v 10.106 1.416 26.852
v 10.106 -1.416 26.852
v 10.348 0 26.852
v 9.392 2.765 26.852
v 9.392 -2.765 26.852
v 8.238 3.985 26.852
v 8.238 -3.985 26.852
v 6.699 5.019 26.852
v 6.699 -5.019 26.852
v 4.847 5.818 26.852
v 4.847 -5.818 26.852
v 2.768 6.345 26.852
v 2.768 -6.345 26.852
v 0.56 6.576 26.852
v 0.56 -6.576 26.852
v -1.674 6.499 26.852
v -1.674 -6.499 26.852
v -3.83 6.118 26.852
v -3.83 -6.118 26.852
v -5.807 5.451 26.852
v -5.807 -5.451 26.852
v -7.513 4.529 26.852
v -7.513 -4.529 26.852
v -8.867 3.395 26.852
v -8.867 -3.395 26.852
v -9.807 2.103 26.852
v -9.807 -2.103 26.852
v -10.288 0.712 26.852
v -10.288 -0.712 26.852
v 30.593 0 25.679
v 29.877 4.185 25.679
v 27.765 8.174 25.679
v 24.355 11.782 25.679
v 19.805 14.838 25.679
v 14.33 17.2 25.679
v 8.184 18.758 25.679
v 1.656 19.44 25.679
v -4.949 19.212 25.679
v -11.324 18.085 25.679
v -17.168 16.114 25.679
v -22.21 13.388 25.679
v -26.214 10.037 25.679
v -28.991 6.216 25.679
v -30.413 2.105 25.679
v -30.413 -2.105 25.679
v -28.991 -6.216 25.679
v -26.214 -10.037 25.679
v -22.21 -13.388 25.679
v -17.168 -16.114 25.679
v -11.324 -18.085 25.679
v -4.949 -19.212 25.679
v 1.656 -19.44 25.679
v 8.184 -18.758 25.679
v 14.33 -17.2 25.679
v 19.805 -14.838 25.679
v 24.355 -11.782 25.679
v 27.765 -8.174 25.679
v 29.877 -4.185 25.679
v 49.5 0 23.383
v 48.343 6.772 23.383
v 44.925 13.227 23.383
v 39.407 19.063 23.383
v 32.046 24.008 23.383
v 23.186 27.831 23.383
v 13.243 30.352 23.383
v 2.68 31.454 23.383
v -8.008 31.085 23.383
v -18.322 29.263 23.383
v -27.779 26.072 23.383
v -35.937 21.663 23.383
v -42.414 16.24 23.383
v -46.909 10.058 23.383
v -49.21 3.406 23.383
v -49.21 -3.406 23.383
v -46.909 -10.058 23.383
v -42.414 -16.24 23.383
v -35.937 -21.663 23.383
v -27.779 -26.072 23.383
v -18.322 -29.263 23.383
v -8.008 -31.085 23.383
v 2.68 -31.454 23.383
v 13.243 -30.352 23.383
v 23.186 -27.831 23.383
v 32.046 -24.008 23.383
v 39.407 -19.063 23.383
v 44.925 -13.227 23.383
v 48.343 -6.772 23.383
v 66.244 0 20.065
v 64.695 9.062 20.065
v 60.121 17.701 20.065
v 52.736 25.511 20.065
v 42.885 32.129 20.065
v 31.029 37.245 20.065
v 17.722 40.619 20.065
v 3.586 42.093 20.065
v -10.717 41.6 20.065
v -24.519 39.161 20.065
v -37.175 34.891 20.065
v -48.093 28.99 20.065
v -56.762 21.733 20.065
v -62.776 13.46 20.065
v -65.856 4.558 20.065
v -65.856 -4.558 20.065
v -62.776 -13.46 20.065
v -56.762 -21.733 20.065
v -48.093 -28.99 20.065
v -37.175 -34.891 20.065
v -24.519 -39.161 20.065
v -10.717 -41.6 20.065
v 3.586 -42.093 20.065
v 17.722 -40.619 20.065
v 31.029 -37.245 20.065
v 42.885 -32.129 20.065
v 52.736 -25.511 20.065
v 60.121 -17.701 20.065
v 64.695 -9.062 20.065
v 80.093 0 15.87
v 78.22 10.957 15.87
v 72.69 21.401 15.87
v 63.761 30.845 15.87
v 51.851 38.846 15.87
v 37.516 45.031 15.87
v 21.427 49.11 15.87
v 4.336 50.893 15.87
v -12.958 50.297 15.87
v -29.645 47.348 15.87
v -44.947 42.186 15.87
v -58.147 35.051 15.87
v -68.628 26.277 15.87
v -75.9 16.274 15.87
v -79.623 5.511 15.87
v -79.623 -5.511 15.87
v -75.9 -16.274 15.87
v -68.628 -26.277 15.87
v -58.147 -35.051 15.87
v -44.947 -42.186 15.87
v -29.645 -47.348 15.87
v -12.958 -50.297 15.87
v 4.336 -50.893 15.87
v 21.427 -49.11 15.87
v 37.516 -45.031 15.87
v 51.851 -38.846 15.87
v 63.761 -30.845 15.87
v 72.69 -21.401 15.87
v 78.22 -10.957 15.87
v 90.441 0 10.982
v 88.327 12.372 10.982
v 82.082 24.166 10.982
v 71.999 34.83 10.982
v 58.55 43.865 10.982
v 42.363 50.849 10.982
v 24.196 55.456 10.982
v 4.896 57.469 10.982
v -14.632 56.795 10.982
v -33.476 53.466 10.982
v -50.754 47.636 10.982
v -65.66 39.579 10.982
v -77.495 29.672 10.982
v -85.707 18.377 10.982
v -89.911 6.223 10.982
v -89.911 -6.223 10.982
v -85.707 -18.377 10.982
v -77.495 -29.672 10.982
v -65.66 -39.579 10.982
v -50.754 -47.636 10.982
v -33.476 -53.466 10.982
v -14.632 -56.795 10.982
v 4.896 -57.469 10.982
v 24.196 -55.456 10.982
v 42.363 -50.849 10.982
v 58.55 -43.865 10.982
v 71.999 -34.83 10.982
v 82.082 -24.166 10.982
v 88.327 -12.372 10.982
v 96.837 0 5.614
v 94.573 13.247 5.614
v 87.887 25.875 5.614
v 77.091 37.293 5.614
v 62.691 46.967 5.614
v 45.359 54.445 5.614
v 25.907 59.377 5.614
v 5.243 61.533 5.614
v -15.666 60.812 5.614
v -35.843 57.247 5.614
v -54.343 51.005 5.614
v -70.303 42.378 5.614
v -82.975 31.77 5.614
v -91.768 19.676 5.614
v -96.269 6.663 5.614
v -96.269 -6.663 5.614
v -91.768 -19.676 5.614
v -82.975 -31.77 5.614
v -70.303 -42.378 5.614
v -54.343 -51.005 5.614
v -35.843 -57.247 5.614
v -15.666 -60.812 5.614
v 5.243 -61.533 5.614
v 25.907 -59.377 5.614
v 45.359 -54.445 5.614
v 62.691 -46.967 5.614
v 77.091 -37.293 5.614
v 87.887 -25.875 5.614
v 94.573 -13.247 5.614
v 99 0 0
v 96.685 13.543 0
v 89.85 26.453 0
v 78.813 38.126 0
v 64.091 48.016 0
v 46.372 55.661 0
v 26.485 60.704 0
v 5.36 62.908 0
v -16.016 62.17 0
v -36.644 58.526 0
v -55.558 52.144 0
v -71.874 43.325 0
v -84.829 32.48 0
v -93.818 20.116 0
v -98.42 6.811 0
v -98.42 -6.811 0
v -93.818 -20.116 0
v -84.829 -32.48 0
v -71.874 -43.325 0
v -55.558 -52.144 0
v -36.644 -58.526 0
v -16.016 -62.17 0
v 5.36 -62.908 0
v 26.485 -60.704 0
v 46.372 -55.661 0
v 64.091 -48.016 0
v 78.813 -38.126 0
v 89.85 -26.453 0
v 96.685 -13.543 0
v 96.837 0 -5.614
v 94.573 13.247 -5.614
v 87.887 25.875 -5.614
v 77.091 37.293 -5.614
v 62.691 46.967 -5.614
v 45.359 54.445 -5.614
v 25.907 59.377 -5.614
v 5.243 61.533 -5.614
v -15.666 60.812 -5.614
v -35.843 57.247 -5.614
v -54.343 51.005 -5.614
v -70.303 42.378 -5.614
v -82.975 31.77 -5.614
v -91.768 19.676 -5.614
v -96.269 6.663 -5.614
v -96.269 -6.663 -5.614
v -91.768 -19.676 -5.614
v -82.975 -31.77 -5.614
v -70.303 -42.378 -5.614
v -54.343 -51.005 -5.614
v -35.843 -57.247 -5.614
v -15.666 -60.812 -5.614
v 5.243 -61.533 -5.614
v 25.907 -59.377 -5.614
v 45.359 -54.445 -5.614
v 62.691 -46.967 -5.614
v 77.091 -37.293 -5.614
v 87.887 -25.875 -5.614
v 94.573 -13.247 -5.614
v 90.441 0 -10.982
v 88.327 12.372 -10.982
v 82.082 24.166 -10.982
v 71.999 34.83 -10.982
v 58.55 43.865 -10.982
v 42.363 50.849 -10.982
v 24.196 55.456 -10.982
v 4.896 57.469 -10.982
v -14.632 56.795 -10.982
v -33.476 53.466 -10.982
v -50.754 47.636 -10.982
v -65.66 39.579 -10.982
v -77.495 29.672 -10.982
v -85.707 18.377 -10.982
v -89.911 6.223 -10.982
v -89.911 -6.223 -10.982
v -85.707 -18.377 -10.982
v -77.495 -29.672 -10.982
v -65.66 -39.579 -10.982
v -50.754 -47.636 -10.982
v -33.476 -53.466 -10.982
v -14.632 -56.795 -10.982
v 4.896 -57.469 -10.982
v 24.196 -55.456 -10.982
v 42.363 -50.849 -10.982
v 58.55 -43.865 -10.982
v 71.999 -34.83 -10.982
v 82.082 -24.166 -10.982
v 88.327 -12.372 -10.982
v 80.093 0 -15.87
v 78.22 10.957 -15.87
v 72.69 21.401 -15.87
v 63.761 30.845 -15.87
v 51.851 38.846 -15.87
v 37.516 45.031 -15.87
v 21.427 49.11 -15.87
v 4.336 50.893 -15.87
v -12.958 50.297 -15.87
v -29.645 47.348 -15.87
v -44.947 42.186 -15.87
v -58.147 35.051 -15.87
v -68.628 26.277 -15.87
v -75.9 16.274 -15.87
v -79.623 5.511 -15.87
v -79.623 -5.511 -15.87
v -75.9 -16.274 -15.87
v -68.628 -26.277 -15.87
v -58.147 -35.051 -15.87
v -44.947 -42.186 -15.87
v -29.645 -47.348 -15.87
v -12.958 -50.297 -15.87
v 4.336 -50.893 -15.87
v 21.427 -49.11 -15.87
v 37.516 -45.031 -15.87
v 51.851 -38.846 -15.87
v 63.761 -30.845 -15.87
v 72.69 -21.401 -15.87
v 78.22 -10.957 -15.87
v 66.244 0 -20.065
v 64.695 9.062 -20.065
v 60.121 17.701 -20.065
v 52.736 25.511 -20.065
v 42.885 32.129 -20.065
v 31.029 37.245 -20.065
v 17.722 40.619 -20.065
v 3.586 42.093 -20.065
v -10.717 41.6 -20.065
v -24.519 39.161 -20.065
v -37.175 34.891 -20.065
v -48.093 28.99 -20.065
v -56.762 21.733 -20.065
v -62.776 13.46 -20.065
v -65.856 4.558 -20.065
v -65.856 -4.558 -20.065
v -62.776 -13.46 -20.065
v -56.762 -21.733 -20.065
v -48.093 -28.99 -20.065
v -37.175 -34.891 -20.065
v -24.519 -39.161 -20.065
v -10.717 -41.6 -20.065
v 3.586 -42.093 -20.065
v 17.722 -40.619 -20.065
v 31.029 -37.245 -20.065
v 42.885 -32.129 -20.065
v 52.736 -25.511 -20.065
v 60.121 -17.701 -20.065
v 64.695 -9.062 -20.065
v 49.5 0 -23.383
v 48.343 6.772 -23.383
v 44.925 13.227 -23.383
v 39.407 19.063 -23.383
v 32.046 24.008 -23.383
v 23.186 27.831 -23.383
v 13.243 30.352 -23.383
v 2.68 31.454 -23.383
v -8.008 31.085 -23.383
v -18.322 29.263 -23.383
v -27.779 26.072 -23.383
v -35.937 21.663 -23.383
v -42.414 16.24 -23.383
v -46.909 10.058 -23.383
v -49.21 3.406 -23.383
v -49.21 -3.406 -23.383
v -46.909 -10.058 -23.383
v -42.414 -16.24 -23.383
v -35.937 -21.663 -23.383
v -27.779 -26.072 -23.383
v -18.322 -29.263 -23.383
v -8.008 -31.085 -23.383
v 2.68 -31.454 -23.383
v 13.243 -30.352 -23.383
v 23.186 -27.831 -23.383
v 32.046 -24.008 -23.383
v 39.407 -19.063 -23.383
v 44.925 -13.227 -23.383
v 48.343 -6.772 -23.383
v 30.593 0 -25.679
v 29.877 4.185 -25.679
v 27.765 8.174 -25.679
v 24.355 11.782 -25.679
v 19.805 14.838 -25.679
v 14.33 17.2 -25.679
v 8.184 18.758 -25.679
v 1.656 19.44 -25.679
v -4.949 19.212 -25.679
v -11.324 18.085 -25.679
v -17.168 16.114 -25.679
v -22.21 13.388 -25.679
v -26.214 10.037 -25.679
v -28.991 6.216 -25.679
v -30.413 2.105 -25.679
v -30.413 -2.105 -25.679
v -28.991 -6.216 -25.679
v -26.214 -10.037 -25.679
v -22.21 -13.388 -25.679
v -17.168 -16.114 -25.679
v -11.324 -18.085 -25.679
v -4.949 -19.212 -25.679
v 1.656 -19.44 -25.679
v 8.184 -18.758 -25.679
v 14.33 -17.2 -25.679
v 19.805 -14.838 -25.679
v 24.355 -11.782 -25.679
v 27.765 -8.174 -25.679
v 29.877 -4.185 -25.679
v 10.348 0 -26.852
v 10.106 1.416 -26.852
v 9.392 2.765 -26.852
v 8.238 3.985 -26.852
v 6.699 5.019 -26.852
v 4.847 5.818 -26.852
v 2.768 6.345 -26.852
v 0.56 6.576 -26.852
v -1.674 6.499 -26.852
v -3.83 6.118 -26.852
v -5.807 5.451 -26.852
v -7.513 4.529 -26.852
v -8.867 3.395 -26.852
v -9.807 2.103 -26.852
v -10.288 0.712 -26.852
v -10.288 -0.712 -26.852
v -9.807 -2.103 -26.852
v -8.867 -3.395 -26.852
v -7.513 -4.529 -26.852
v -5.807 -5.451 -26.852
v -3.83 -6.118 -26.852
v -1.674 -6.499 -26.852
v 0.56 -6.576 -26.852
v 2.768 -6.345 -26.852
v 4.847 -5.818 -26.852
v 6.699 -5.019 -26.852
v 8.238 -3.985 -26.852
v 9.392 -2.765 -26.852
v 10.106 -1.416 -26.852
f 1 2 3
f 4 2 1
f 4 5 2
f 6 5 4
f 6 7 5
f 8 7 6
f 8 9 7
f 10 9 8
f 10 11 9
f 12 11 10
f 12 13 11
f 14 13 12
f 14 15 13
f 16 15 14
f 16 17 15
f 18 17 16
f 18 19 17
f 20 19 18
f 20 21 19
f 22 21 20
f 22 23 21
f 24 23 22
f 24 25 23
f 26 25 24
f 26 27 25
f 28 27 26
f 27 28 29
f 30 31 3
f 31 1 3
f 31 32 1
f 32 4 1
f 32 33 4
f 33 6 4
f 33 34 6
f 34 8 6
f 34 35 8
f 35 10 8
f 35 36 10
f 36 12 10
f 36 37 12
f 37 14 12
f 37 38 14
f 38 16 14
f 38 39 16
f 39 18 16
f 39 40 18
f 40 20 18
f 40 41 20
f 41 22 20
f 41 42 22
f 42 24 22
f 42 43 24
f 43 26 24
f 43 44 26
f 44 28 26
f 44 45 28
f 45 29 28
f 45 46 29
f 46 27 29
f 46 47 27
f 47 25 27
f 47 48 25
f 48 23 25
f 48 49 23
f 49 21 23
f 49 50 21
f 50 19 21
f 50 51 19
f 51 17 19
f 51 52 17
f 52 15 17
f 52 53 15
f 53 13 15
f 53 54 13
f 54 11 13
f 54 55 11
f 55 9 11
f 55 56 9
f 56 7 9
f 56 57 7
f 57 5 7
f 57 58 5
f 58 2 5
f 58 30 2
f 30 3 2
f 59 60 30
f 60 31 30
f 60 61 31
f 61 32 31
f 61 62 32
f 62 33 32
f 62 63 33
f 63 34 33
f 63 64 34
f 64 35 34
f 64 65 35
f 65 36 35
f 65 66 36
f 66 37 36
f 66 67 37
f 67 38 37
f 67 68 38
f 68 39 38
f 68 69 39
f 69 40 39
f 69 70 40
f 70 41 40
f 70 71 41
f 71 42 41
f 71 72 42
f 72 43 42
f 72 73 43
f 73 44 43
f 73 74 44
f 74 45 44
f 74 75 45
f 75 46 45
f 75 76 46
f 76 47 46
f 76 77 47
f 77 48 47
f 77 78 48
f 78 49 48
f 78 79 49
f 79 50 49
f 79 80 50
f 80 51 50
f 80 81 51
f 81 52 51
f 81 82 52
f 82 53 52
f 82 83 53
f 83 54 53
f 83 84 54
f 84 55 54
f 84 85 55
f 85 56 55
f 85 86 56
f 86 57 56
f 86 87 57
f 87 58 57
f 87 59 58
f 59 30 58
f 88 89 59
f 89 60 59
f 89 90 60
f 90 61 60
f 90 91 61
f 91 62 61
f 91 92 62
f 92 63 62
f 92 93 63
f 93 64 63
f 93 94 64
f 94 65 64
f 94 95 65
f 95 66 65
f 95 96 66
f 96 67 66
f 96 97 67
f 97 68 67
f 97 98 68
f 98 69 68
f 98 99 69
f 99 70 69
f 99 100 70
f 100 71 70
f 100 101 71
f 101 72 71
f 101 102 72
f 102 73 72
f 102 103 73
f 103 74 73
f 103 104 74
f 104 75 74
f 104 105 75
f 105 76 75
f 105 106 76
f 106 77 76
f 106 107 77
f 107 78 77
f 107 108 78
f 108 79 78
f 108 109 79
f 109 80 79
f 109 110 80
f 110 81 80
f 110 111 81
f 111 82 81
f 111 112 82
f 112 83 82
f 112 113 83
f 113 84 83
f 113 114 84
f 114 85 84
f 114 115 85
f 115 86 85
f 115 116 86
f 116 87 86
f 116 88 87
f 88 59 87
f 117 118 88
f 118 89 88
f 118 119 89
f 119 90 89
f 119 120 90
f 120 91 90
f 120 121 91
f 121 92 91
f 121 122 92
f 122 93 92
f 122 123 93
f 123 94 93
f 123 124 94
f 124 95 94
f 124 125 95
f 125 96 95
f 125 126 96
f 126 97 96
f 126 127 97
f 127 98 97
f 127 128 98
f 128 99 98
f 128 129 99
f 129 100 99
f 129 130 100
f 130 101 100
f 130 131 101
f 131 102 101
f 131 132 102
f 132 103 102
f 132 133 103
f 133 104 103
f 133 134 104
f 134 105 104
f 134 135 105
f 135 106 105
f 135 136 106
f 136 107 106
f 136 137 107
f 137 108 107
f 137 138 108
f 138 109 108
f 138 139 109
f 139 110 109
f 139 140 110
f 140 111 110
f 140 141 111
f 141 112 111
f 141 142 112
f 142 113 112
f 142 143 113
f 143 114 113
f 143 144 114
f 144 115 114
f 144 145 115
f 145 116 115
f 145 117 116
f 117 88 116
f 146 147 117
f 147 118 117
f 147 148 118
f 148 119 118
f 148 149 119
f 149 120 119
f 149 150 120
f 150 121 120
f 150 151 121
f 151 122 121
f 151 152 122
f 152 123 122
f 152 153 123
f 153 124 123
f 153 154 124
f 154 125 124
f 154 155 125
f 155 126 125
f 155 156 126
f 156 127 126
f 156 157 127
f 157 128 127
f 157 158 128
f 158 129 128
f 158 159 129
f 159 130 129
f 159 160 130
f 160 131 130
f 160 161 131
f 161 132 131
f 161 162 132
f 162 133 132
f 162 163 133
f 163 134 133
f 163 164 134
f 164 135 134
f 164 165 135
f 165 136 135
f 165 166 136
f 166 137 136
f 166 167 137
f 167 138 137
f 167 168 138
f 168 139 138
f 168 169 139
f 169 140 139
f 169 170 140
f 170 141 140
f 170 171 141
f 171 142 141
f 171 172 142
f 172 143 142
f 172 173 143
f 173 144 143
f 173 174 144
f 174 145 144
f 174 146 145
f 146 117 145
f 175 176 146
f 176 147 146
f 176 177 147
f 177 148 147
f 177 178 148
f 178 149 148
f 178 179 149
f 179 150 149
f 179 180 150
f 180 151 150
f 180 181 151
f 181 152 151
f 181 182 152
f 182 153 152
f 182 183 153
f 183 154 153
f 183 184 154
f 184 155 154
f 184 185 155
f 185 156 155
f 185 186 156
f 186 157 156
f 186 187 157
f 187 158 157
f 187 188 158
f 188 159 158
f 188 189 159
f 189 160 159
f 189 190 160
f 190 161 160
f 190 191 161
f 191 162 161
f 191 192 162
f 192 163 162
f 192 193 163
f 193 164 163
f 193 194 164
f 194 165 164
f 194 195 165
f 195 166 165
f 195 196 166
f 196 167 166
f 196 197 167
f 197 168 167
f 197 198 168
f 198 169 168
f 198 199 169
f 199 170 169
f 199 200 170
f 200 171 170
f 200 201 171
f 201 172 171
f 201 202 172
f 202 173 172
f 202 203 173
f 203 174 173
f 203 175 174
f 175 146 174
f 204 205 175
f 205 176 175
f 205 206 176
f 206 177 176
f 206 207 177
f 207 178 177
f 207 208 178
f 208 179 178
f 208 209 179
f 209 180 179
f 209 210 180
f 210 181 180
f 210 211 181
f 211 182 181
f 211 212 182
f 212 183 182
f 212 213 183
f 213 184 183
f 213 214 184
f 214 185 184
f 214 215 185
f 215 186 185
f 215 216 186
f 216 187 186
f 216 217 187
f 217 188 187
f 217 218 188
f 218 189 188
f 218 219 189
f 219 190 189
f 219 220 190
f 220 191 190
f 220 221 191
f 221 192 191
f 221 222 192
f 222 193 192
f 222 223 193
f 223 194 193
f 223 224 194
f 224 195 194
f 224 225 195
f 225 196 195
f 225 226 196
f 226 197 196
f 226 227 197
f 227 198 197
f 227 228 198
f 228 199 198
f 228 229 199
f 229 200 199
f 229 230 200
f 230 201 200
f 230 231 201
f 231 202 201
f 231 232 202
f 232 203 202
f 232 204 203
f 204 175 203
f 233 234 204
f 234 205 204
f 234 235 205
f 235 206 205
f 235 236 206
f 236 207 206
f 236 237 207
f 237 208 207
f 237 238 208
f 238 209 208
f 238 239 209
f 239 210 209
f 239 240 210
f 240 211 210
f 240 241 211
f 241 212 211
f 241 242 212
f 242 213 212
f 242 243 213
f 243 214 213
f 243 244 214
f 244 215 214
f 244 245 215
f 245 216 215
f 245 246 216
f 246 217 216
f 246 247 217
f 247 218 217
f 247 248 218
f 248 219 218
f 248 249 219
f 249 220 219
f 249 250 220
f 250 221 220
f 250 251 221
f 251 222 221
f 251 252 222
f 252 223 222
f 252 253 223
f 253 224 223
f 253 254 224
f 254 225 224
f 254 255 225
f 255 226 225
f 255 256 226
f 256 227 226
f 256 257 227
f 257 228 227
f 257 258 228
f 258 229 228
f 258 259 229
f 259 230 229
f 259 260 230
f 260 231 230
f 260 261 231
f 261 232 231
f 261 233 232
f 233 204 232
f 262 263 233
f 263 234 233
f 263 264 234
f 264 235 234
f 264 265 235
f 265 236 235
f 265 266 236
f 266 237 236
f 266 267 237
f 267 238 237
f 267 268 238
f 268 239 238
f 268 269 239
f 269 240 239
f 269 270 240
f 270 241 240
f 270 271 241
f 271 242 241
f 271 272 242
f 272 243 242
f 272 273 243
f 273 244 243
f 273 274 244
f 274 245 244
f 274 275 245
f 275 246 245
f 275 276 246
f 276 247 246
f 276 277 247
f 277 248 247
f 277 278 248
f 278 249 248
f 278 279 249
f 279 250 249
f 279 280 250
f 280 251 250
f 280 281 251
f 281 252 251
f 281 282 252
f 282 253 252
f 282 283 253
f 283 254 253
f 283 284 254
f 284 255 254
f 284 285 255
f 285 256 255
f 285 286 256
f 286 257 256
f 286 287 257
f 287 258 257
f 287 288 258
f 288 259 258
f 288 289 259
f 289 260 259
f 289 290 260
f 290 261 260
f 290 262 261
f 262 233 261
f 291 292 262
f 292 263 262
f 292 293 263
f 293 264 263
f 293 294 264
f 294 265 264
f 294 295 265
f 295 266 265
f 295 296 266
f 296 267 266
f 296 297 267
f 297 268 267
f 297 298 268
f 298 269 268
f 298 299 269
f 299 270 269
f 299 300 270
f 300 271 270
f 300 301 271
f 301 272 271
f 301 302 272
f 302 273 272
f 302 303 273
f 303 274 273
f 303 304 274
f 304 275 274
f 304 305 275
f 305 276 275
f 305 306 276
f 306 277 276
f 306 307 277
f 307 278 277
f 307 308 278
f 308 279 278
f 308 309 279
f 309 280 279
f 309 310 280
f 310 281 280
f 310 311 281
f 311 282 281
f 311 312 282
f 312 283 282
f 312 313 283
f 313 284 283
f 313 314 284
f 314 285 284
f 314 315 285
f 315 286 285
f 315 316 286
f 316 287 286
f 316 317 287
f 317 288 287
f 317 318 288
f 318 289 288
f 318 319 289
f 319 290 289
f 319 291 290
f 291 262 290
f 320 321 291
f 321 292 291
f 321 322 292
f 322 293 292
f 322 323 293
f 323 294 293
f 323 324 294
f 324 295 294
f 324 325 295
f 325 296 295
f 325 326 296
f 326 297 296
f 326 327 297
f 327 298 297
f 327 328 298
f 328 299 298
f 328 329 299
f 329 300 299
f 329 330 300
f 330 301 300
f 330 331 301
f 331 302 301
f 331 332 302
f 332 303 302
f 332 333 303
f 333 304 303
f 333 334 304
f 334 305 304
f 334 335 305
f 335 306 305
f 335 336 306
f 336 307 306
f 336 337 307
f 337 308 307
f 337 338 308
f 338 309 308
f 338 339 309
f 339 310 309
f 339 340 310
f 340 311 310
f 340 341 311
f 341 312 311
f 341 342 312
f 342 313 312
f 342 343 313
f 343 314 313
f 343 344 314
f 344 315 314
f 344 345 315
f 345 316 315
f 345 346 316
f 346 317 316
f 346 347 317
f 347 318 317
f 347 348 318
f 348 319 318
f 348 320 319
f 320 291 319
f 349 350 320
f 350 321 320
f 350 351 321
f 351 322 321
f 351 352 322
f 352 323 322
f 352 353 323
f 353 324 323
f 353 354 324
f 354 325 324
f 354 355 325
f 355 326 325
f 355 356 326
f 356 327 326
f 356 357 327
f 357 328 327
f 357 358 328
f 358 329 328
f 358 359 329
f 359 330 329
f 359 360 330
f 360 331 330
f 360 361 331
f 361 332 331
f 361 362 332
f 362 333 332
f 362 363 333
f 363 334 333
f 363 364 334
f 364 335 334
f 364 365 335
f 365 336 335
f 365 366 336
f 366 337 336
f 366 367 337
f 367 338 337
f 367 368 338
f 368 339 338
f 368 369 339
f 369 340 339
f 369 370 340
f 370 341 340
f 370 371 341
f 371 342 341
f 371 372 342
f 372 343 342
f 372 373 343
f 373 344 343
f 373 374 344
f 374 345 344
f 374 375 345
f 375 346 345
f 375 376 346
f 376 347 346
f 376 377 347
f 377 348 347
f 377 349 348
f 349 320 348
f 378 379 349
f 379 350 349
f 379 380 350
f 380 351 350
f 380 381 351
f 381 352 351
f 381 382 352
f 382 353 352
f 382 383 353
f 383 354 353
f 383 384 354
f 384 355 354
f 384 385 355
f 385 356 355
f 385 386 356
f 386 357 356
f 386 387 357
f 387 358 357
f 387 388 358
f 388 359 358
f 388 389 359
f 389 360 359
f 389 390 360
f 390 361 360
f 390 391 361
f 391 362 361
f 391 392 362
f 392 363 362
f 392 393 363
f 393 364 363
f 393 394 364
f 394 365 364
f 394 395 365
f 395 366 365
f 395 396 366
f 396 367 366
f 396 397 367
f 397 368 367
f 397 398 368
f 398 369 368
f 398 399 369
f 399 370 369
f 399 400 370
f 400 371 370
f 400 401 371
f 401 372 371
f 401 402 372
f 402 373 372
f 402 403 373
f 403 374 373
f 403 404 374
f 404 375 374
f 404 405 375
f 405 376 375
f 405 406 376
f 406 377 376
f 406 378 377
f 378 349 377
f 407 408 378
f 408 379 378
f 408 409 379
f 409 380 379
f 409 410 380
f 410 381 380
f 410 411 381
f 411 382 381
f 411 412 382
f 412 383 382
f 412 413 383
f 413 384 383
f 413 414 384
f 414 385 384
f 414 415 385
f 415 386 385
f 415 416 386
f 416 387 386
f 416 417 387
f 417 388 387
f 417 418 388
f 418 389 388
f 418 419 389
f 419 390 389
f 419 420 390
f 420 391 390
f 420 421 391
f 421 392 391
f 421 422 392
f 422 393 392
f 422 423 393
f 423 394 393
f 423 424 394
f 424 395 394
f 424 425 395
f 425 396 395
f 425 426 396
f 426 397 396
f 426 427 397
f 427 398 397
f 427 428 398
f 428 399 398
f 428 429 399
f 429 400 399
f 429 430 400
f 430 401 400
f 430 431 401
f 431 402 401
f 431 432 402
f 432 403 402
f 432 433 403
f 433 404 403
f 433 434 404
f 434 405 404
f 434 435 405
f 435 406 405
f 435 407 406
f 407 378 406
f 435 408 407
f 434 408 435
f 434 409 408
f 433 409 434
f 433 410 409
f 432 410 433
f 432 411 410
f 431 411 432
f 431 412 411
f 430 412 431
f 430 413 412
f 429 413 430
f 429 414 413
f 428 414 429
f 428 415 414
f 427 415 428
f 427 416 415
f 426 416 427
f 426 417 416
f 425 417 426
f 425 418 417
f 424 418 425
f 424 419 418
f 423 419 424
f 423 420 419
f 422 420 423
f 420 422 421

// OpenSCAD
// Generated by SolidPython 1.0.1 on 2020-07-29 00:46:49


scale(v = [11, 7, 3]) {
	sphere(r = 9);
}
/***********************************************
*********      SolidPython code:      **********
************************************************
 
# import packages: SolidPython
from solid import *
from solid.utils import *
from itertools import chain, combinations, permutations


class Resize:

    def __init__(self, scad_file):
        self.scad_file = scad_file
        #self.scad_file = import_scad(scad_file)
        # cone/cylinder param:
        self.r1 = 0
        self.r2 = 0
        self.h = 0
        # rectangular prism param:
        self.w = 0
        self.l = 0
        # ellipse param:
        self.r = 0

    # import OpenScad code (file name corresponds to shape)


    # classify shape + parameters
    def assign(self, param1, param2, param3):
        if self.scad_file == 'cone.scad':
            self.r1 = param1
            self.r2 = param2
            self.h = param3
        elif self.scad_file == 'cylinder.scad':
            self.r1 = param1
            self.r2 = param2
            self.h = param3
        elif self.scad_file == 'rectangularPrism.scad':
            self.h = param1
            self.l = param2
            self.w = param3
        else:
            self.r = param1
            self.h = param2

    # resize parameters
    def iterate(self):
        x = range(3, 20, 2)
        i = 1
        if self.scad_file == 'cone.scad':
            tempList = list(permutations(x, 2))
            for temp in tempList:
                param1 = temp[0]
                param2 = temp[1]
                filepath = 'produced_scad_files/' + 'cone' + str(param1) + '_' + str(param2) + '_' + '.scad'
                scad_render_to_file(cylinder(h=param1, r1=param2, r2=0), filepath)

        elif self.scad_file == 'cylinder.scad':
            tempList = list(permutations(x, 3))
            for temp in tempList:
                param1 = temp[0]
                param2 = temp[1]
                filepath = 'produced_scad_files/' + 'cylinder' + str(param1) + '_' + str(param2) + '_' + '.scad'
                scad_render_to_file(cylinder(h=param1, r1=param2, r2=param2), filepath)

        elif self.scad_file == 'rectangularPrism.scad':
            tempList = list(permutations(x, 3))
            for temp in tempList:
                param1 = temp[0]
                param2 = temp[1]
                param3 = temp[2]
                filepath = 'produced_scad_files/' + 'rectangularPrism' + str(param1) + '_' + str(param2) + '_' + str(
                    param3) + '.scad'
                scad_render_to_file(cube(size=(param1, param2, param3)), filepath)

        elif self.scad_file == 'ellipse.scad':
            tempList = list(permutations(x, 4))
            for temp in tempList:
                param1 = temp[0]
                param2 = temp[1]
                param3 = temp[2]
                param4 = temp[3]
                filepath = 'produced_scad_files/' + 'ellipse' + str(param1) + '_' + str(param2) + '_' + str(param3) + '_' + str(param4) + '.scad'
                scad_render_to_file(scale([param1, param2, param3])(sphere(r=param4)), filepath)

    def render_to_scadfile(self):
        scad_render_to_file(scad, 'example.scad') 
 
************************************************/
